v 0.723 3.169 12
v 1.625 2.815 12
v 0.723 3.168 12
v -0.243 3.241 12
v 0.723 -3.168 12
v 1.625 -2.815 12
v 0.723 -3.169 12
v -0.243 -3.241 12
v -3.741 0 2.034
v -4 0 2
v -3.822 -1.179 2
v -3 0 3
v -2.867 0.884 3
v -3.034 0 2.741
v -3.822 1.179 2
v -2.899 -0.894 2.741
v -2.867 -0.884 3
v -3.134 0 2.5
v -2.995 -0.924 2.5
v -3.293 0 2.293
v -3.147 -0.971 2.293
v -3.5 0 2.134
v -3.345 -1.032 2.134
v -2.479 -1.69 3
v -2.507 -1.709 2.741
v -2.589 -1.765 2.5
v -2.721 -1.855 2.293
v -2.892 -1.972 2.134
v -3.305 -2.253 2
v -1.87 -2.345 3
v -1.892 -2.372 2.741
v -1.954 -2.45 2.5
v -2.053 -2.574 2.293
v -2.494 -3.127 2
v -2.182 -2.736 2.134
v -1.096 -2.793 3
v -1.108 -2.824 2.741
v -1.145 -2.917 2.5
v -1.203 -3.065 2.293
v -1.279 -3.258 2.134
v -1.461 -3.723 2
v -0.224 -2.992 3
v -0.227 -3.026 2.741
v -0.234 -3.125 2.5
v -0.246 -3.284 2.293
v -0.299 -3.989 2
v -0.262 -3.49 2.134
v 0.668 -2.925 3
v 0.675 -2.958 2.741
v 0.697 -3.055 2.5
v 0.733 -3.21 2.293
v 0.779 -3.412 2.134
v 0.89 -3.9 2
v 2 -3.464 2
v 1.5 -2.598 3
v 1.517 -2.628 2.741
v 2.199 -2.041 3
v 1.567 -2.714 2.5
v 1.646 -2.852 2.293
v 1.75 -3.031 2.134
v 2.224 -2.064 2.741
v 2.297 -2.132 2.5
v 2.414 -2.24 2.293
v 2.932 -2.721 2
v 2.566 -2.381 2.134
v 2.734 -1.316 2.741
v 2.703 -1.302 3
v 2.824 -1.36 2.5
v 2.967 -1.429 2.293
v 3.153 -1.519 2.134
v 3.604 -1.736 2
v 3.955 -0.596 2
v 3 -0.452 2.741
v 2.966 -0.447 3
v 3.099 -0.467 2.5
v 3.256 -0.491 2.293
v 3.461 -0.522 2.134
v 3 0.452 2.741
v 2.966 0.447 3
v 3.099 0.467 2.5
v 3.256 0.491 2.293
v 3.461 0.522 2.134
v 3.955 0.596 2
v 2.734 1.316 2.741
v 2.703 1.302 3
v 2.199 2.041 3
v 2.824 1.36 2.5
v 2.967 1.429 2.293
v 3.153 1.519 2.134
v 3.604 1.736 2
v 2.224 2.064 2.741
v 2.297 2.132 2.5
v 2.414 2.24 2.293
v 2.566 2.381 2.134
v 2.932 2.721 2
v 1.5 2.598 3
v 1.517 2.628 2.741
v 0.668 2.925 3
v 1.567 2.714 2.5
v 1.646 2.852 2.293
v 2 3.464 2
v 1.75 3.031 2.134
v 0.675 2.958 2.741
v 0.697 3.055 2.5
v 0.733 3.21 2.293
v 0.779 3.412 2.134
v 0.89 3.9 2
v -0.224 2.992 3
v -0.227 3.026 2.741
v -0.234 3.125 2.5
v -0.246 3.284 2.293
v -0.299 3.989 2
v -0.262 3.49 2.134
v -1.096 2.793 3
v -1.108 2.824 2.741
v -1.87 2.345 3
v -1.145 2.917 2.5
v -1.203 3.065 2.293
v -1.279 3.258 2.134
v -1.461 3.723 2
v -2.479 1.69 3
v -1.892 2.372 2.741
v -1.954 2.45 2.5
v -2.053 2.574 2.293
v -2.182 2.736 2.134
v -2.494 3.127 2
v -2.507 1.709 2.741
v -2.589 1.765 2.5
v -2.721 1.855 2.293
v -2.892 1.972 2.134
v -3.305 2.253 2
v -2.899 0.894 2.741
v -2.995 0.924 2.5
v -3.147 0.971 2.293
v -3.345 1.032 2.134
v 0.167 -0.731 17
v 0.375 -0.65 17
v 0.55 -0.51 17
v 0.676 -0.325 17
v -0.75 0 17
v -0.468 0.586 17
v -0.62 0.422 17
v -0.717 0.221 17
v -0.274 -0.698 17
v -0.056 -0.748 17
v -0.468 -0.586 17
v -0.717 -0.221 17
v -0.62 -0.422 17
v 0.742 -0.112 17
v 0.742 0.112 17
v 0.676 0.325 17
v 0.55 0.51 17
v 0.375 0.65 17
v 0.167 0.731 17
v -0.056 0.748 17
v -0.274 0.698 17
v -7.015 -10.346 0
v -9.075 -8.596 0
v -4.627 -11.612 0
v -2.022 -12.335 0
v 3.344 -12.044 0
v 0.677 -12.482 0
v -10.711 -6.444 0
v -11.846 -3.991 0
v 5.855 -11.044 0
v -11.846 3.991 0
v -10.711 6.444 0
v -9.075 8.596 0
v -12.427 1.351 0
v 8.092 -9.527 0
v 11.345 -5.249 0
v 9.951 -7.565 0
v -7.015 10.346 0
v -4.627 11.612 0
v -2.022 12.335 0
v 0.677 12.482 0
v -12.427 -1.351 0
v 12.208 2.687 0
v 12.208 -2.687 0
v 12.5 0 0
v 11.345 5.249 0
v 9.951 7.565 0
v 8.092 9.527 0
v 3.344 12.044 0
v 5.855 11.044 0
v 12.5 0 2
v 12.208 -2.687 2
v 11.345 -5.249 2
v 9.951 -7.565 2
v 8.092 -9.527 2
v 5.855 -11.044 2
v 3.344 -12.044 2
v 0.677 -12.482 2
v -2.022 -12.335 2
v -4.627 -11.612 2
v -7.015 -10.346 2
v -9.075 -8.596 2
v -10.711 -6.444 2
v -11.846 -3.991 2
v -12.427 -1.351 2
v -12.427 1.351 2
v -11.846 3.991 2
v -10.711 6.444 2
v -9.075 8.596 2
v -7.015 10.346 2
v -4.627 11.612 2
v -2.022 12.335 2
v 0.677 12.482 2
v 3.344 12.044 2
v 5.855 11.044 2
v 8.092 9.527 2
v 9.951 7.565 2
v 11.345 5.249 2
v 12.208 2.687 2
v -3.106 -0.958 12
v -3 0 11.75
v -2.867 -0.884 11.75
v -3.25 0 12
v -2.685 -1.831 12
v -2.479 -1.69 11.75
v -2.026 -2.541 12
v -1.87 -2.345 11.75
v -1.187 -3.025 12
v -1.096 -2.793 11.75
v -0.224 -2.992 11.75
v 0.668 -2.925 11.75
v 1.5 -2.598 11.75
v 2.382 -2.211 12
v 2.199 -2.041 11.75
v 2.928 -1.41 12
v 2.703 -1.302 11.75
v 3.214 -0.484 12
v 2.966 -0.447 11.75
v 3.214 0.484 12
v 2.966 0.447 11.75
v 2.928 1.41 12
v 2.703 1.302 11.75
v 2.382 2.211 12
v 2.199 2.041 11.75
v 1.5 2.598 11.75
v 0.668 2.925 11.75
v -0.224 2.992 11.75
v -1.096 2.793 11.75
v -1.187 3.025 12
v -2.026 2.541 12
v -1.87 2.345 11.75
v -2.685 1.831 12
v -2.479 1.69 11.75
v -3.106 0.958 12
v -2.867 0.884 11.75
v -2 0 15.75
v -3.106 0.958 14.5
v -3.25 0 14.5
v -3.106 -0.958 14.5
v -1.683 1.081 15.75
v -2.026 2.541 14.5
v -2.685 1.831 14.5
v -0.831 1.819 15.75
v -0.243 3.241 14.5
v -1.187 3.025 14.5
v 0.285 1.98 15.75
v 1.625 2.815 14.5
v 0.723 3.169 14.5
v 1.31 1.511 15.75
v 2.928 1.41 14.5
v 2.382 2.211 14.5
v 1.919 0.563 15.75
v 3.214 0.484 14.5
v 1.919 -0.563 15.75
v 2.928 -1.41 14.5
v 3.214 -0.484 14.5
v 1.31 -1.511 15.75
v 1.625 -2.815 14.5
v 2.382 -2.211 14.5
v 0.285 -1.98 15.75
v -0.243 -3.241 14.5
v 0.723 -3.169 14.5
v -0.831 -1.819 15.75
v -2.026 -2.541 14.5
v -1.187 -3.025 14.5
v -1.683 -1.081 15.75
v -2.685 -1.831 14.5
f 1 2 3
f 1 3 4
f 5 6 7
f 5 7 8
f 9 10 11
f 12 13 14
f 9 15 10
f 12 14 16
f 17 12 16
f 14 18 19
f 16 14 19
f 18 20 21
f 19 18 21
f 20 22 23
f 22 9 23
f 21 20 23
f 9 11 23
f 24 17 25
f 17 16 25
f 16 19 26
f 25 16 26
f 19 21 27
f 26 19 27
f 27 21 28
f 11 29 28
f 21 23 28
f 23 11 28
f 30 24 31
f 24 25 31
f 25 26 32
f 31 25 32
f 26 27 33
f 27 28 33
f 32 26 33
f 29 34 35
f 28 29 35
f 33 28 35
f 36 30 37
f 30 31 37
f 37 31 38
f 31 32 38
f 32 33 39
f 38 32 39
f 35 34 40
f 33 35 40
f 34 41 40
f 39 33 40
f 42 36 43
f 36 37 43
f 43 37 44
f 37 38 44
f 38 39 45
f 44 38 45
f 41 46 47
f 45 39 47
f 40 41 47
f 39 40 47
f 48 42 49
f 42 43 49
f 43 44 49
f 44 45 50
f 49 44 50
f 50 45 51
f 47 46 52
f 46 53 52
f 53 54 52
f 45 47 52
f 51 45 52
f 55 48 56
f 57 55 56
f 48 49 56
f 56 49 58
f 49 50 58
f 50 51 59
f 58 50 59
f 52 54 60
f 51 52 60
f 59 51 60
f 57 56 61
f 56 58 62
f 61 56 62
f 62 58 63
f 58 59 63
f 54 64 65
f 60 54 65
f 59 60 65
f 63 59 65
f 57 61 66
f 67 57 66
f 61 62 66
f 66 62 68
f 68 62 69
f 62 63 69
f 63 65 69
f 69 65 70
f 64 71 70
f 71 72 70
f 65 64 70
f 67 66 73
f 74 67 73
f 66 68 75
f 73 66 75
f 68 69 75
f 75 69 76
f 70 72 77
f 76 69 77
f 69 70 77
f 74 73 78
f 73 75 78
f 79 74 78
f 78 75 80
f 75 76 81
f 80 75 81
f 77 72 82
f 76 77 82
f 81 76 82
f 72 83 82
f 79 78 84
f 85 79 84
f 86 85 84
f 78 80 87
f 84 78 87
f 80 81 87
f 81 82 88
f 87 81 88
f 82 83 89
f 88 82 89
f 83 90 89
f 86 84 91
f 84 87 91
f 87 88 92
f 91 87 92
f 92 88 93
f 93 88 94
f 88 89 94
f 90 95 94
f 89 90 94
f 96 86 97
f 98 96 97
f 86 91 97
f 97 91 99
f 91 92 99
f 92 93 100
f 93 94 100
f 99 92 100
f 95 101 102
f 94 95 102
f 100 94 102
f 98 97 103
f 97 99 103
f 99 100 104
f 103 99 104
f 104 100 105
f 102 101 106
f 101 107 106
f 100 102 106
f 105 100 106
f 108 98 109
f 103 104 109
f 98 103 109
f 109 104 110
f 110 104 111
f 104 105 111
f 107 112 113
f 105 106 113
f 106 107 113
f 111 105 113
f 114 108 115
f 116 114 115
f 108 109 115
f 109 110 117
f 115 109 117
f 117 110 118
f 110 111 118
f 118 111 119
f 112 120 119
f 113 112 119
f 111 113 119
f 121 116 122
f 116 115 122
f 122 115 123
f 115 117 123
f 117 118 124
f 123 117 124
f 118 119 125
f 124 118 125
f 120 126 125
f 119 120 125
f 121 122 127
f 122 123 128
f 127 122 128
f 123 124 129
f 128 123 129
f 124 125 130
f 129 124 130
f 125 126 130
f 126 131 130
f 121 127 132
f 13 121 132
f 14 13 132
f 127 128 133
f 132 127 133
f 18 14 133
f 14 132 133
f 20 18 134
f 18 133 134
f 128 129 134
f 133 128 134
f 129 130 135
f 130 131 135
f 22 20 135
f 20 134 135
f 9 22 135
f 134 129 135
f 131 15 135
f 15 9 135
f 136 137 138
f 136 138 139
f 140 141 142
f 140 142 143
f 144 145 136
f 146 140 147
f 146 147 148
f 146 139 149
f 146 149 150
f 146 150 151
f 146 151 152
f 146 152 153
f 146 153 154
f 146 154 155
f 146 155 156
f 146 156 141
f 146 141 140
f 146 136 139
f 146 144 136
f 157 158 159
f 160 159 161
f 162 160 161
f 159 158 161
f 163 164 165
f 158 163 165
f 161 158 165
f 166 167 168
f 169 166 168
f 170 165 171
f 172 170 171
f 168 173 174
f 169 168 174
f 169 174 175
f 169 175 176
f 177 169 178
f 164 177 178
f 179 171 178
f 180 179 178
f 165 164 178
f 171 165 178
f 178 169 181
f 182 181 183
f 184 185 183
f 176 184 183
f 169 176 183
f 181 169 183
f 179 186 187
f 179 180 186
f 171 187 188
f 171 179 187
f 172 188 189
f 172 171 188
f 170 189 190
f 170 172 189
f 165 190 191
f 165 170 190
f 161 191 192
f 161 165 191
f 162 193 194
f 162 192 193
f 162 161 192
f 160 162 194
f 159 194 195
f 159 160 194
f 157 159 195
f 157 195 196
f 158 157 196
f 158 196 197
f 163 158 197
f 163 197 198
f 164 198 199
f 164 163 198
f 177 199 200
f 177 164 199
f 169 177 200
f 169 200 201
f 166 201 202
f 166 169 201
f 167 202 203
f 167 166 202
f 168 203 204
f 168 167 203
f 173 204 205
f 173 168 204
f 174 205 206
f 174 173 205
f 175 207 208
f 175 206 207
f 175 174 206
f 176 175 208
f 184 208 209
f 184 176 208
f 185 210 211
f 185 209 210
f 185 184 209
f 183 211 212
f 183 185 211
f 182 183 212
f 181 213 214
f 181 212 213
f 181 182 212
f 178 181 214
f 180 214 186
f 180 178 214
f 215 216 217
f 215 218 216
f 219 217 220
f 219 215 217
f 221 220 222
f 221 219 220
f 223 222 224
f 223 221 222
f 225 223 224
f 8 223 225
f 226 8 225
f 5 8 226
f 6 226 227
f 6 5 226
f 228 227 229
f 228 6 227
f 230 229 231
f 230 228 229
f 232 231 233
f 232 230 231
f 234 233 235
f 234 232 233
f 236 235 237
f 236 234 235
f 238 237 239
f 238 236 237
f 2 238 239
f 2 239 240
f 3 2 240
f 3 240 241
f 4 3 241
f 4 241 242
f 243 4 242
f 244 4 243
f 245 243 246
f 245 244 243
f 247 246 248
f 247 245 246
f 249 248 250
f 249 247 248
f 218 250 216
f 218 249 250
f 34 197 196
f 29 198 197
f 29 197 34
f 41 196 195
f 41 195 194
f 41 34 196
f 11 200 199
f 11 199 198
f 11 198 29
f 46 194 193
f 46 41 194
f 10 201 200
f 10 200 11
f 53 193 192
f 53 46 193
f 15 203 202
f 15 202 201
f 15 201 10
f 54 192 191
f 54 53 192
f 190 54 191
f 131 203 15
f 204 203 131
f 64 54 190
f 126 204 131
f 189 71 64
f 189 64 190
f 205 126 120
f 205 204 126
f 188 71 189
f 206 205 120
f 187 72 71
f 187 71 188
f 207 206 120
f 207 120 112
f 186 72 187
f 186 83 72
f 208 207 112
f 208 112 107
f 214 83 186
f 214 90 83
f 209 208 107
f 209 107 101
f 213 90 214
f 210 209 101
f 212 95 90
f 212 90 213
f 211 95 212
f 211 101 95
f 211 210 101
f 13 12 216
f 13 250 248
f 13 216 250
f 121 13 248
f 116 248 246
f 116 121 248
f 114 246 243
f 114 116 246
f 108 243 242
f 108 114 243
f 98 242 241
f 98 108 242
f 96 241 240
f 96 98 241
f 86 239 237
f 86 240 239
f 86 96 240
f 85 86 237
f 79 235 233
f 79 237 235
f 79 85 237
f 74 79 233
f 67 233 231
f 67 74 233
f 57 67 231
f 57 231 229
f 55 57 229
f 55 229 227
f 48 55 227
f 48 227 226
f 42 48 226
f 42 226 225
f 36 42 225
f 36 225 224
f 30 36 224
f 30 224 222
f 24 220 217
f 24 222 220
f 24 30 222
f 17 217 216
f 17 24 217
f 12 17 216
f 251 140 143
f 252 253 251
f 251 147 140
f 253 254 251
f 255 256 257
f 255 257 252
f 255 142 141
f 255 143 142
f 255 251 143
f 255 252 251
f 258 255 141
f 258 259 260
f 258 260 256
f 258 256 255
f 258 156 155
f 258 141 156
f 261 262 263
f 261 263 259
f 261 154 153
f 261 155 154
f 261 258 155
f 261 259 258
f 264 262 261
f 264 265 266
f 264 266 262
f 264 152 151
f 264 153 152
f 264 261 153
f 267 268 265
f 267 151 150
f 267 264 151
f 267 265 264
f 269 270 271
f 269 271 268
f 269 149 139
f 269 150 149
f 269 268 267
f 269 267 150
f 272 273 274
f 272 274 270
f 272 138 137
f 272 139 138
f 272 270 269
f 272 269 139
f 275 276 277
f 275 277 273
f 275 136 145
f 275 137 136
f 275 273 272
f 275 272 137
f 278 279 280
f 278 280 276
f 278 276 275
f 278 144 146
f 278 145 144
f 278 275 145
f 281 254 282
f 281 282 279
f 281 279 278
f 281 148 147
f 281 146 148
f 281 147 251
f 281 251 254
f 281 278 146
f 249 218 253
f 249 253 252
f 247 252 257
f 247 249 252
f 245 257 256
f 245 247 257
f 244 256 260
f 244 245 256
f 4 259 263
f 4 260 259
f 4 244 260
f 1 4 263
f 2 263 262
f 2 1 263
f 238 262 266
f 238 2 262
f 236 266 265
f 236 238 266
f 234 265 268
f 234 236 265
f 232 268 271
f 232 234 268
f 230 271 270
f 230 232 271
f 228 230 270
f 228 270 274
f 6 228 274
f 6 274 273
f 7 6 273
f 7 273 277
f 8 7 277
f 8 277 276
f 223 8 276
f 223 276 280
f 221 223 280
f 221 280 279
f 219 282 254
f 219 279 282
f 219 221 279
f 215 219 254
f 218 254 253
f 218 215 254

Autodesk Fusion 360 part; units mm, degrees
sketch "Sketch1" plane through (0, 0, 0) normal (0, 0, 1) x (1, 0, 0)
  circle A0 centre (0, 0) radius 12.5
extrude "Extrude1" add sketch "Sketch1" along normal blind 2
sketch "Sketch2" plane through (0, 0, 2) normal (0, 0, 1) x (-1, 0, 0)
  circle A0 centre (0, 0) radius 12.5
  circle A1 centre (0, 0) radius 3
extrude "Extrude2" add sketch "Sketch2" along normal blind 10 contours A1
sketch "Sketch3" plane through (0, 0, 12) normal (0, 0, 1) x (-1, 0, 0)
  circle A0 centre (0, 0) radius 3
  circle A1 centre (0, 0) radius 3.25
  dimension "d8" = 6.5
extrude "Extrude3" add sketch "Sketch3" along normal blind 5 contours A0 | A1
chamfer "Chamfer1" distance 2.5 angle 45 1 edges at (3.0301, 1.1753, 17)
chamfer "Chamfer2" distance 0.25 angle 45 1 edges at (2.797, 1.0848, 12)
fillet "Fillet1" radius 1 1 edges at (2.797, -1.0848, 2)
